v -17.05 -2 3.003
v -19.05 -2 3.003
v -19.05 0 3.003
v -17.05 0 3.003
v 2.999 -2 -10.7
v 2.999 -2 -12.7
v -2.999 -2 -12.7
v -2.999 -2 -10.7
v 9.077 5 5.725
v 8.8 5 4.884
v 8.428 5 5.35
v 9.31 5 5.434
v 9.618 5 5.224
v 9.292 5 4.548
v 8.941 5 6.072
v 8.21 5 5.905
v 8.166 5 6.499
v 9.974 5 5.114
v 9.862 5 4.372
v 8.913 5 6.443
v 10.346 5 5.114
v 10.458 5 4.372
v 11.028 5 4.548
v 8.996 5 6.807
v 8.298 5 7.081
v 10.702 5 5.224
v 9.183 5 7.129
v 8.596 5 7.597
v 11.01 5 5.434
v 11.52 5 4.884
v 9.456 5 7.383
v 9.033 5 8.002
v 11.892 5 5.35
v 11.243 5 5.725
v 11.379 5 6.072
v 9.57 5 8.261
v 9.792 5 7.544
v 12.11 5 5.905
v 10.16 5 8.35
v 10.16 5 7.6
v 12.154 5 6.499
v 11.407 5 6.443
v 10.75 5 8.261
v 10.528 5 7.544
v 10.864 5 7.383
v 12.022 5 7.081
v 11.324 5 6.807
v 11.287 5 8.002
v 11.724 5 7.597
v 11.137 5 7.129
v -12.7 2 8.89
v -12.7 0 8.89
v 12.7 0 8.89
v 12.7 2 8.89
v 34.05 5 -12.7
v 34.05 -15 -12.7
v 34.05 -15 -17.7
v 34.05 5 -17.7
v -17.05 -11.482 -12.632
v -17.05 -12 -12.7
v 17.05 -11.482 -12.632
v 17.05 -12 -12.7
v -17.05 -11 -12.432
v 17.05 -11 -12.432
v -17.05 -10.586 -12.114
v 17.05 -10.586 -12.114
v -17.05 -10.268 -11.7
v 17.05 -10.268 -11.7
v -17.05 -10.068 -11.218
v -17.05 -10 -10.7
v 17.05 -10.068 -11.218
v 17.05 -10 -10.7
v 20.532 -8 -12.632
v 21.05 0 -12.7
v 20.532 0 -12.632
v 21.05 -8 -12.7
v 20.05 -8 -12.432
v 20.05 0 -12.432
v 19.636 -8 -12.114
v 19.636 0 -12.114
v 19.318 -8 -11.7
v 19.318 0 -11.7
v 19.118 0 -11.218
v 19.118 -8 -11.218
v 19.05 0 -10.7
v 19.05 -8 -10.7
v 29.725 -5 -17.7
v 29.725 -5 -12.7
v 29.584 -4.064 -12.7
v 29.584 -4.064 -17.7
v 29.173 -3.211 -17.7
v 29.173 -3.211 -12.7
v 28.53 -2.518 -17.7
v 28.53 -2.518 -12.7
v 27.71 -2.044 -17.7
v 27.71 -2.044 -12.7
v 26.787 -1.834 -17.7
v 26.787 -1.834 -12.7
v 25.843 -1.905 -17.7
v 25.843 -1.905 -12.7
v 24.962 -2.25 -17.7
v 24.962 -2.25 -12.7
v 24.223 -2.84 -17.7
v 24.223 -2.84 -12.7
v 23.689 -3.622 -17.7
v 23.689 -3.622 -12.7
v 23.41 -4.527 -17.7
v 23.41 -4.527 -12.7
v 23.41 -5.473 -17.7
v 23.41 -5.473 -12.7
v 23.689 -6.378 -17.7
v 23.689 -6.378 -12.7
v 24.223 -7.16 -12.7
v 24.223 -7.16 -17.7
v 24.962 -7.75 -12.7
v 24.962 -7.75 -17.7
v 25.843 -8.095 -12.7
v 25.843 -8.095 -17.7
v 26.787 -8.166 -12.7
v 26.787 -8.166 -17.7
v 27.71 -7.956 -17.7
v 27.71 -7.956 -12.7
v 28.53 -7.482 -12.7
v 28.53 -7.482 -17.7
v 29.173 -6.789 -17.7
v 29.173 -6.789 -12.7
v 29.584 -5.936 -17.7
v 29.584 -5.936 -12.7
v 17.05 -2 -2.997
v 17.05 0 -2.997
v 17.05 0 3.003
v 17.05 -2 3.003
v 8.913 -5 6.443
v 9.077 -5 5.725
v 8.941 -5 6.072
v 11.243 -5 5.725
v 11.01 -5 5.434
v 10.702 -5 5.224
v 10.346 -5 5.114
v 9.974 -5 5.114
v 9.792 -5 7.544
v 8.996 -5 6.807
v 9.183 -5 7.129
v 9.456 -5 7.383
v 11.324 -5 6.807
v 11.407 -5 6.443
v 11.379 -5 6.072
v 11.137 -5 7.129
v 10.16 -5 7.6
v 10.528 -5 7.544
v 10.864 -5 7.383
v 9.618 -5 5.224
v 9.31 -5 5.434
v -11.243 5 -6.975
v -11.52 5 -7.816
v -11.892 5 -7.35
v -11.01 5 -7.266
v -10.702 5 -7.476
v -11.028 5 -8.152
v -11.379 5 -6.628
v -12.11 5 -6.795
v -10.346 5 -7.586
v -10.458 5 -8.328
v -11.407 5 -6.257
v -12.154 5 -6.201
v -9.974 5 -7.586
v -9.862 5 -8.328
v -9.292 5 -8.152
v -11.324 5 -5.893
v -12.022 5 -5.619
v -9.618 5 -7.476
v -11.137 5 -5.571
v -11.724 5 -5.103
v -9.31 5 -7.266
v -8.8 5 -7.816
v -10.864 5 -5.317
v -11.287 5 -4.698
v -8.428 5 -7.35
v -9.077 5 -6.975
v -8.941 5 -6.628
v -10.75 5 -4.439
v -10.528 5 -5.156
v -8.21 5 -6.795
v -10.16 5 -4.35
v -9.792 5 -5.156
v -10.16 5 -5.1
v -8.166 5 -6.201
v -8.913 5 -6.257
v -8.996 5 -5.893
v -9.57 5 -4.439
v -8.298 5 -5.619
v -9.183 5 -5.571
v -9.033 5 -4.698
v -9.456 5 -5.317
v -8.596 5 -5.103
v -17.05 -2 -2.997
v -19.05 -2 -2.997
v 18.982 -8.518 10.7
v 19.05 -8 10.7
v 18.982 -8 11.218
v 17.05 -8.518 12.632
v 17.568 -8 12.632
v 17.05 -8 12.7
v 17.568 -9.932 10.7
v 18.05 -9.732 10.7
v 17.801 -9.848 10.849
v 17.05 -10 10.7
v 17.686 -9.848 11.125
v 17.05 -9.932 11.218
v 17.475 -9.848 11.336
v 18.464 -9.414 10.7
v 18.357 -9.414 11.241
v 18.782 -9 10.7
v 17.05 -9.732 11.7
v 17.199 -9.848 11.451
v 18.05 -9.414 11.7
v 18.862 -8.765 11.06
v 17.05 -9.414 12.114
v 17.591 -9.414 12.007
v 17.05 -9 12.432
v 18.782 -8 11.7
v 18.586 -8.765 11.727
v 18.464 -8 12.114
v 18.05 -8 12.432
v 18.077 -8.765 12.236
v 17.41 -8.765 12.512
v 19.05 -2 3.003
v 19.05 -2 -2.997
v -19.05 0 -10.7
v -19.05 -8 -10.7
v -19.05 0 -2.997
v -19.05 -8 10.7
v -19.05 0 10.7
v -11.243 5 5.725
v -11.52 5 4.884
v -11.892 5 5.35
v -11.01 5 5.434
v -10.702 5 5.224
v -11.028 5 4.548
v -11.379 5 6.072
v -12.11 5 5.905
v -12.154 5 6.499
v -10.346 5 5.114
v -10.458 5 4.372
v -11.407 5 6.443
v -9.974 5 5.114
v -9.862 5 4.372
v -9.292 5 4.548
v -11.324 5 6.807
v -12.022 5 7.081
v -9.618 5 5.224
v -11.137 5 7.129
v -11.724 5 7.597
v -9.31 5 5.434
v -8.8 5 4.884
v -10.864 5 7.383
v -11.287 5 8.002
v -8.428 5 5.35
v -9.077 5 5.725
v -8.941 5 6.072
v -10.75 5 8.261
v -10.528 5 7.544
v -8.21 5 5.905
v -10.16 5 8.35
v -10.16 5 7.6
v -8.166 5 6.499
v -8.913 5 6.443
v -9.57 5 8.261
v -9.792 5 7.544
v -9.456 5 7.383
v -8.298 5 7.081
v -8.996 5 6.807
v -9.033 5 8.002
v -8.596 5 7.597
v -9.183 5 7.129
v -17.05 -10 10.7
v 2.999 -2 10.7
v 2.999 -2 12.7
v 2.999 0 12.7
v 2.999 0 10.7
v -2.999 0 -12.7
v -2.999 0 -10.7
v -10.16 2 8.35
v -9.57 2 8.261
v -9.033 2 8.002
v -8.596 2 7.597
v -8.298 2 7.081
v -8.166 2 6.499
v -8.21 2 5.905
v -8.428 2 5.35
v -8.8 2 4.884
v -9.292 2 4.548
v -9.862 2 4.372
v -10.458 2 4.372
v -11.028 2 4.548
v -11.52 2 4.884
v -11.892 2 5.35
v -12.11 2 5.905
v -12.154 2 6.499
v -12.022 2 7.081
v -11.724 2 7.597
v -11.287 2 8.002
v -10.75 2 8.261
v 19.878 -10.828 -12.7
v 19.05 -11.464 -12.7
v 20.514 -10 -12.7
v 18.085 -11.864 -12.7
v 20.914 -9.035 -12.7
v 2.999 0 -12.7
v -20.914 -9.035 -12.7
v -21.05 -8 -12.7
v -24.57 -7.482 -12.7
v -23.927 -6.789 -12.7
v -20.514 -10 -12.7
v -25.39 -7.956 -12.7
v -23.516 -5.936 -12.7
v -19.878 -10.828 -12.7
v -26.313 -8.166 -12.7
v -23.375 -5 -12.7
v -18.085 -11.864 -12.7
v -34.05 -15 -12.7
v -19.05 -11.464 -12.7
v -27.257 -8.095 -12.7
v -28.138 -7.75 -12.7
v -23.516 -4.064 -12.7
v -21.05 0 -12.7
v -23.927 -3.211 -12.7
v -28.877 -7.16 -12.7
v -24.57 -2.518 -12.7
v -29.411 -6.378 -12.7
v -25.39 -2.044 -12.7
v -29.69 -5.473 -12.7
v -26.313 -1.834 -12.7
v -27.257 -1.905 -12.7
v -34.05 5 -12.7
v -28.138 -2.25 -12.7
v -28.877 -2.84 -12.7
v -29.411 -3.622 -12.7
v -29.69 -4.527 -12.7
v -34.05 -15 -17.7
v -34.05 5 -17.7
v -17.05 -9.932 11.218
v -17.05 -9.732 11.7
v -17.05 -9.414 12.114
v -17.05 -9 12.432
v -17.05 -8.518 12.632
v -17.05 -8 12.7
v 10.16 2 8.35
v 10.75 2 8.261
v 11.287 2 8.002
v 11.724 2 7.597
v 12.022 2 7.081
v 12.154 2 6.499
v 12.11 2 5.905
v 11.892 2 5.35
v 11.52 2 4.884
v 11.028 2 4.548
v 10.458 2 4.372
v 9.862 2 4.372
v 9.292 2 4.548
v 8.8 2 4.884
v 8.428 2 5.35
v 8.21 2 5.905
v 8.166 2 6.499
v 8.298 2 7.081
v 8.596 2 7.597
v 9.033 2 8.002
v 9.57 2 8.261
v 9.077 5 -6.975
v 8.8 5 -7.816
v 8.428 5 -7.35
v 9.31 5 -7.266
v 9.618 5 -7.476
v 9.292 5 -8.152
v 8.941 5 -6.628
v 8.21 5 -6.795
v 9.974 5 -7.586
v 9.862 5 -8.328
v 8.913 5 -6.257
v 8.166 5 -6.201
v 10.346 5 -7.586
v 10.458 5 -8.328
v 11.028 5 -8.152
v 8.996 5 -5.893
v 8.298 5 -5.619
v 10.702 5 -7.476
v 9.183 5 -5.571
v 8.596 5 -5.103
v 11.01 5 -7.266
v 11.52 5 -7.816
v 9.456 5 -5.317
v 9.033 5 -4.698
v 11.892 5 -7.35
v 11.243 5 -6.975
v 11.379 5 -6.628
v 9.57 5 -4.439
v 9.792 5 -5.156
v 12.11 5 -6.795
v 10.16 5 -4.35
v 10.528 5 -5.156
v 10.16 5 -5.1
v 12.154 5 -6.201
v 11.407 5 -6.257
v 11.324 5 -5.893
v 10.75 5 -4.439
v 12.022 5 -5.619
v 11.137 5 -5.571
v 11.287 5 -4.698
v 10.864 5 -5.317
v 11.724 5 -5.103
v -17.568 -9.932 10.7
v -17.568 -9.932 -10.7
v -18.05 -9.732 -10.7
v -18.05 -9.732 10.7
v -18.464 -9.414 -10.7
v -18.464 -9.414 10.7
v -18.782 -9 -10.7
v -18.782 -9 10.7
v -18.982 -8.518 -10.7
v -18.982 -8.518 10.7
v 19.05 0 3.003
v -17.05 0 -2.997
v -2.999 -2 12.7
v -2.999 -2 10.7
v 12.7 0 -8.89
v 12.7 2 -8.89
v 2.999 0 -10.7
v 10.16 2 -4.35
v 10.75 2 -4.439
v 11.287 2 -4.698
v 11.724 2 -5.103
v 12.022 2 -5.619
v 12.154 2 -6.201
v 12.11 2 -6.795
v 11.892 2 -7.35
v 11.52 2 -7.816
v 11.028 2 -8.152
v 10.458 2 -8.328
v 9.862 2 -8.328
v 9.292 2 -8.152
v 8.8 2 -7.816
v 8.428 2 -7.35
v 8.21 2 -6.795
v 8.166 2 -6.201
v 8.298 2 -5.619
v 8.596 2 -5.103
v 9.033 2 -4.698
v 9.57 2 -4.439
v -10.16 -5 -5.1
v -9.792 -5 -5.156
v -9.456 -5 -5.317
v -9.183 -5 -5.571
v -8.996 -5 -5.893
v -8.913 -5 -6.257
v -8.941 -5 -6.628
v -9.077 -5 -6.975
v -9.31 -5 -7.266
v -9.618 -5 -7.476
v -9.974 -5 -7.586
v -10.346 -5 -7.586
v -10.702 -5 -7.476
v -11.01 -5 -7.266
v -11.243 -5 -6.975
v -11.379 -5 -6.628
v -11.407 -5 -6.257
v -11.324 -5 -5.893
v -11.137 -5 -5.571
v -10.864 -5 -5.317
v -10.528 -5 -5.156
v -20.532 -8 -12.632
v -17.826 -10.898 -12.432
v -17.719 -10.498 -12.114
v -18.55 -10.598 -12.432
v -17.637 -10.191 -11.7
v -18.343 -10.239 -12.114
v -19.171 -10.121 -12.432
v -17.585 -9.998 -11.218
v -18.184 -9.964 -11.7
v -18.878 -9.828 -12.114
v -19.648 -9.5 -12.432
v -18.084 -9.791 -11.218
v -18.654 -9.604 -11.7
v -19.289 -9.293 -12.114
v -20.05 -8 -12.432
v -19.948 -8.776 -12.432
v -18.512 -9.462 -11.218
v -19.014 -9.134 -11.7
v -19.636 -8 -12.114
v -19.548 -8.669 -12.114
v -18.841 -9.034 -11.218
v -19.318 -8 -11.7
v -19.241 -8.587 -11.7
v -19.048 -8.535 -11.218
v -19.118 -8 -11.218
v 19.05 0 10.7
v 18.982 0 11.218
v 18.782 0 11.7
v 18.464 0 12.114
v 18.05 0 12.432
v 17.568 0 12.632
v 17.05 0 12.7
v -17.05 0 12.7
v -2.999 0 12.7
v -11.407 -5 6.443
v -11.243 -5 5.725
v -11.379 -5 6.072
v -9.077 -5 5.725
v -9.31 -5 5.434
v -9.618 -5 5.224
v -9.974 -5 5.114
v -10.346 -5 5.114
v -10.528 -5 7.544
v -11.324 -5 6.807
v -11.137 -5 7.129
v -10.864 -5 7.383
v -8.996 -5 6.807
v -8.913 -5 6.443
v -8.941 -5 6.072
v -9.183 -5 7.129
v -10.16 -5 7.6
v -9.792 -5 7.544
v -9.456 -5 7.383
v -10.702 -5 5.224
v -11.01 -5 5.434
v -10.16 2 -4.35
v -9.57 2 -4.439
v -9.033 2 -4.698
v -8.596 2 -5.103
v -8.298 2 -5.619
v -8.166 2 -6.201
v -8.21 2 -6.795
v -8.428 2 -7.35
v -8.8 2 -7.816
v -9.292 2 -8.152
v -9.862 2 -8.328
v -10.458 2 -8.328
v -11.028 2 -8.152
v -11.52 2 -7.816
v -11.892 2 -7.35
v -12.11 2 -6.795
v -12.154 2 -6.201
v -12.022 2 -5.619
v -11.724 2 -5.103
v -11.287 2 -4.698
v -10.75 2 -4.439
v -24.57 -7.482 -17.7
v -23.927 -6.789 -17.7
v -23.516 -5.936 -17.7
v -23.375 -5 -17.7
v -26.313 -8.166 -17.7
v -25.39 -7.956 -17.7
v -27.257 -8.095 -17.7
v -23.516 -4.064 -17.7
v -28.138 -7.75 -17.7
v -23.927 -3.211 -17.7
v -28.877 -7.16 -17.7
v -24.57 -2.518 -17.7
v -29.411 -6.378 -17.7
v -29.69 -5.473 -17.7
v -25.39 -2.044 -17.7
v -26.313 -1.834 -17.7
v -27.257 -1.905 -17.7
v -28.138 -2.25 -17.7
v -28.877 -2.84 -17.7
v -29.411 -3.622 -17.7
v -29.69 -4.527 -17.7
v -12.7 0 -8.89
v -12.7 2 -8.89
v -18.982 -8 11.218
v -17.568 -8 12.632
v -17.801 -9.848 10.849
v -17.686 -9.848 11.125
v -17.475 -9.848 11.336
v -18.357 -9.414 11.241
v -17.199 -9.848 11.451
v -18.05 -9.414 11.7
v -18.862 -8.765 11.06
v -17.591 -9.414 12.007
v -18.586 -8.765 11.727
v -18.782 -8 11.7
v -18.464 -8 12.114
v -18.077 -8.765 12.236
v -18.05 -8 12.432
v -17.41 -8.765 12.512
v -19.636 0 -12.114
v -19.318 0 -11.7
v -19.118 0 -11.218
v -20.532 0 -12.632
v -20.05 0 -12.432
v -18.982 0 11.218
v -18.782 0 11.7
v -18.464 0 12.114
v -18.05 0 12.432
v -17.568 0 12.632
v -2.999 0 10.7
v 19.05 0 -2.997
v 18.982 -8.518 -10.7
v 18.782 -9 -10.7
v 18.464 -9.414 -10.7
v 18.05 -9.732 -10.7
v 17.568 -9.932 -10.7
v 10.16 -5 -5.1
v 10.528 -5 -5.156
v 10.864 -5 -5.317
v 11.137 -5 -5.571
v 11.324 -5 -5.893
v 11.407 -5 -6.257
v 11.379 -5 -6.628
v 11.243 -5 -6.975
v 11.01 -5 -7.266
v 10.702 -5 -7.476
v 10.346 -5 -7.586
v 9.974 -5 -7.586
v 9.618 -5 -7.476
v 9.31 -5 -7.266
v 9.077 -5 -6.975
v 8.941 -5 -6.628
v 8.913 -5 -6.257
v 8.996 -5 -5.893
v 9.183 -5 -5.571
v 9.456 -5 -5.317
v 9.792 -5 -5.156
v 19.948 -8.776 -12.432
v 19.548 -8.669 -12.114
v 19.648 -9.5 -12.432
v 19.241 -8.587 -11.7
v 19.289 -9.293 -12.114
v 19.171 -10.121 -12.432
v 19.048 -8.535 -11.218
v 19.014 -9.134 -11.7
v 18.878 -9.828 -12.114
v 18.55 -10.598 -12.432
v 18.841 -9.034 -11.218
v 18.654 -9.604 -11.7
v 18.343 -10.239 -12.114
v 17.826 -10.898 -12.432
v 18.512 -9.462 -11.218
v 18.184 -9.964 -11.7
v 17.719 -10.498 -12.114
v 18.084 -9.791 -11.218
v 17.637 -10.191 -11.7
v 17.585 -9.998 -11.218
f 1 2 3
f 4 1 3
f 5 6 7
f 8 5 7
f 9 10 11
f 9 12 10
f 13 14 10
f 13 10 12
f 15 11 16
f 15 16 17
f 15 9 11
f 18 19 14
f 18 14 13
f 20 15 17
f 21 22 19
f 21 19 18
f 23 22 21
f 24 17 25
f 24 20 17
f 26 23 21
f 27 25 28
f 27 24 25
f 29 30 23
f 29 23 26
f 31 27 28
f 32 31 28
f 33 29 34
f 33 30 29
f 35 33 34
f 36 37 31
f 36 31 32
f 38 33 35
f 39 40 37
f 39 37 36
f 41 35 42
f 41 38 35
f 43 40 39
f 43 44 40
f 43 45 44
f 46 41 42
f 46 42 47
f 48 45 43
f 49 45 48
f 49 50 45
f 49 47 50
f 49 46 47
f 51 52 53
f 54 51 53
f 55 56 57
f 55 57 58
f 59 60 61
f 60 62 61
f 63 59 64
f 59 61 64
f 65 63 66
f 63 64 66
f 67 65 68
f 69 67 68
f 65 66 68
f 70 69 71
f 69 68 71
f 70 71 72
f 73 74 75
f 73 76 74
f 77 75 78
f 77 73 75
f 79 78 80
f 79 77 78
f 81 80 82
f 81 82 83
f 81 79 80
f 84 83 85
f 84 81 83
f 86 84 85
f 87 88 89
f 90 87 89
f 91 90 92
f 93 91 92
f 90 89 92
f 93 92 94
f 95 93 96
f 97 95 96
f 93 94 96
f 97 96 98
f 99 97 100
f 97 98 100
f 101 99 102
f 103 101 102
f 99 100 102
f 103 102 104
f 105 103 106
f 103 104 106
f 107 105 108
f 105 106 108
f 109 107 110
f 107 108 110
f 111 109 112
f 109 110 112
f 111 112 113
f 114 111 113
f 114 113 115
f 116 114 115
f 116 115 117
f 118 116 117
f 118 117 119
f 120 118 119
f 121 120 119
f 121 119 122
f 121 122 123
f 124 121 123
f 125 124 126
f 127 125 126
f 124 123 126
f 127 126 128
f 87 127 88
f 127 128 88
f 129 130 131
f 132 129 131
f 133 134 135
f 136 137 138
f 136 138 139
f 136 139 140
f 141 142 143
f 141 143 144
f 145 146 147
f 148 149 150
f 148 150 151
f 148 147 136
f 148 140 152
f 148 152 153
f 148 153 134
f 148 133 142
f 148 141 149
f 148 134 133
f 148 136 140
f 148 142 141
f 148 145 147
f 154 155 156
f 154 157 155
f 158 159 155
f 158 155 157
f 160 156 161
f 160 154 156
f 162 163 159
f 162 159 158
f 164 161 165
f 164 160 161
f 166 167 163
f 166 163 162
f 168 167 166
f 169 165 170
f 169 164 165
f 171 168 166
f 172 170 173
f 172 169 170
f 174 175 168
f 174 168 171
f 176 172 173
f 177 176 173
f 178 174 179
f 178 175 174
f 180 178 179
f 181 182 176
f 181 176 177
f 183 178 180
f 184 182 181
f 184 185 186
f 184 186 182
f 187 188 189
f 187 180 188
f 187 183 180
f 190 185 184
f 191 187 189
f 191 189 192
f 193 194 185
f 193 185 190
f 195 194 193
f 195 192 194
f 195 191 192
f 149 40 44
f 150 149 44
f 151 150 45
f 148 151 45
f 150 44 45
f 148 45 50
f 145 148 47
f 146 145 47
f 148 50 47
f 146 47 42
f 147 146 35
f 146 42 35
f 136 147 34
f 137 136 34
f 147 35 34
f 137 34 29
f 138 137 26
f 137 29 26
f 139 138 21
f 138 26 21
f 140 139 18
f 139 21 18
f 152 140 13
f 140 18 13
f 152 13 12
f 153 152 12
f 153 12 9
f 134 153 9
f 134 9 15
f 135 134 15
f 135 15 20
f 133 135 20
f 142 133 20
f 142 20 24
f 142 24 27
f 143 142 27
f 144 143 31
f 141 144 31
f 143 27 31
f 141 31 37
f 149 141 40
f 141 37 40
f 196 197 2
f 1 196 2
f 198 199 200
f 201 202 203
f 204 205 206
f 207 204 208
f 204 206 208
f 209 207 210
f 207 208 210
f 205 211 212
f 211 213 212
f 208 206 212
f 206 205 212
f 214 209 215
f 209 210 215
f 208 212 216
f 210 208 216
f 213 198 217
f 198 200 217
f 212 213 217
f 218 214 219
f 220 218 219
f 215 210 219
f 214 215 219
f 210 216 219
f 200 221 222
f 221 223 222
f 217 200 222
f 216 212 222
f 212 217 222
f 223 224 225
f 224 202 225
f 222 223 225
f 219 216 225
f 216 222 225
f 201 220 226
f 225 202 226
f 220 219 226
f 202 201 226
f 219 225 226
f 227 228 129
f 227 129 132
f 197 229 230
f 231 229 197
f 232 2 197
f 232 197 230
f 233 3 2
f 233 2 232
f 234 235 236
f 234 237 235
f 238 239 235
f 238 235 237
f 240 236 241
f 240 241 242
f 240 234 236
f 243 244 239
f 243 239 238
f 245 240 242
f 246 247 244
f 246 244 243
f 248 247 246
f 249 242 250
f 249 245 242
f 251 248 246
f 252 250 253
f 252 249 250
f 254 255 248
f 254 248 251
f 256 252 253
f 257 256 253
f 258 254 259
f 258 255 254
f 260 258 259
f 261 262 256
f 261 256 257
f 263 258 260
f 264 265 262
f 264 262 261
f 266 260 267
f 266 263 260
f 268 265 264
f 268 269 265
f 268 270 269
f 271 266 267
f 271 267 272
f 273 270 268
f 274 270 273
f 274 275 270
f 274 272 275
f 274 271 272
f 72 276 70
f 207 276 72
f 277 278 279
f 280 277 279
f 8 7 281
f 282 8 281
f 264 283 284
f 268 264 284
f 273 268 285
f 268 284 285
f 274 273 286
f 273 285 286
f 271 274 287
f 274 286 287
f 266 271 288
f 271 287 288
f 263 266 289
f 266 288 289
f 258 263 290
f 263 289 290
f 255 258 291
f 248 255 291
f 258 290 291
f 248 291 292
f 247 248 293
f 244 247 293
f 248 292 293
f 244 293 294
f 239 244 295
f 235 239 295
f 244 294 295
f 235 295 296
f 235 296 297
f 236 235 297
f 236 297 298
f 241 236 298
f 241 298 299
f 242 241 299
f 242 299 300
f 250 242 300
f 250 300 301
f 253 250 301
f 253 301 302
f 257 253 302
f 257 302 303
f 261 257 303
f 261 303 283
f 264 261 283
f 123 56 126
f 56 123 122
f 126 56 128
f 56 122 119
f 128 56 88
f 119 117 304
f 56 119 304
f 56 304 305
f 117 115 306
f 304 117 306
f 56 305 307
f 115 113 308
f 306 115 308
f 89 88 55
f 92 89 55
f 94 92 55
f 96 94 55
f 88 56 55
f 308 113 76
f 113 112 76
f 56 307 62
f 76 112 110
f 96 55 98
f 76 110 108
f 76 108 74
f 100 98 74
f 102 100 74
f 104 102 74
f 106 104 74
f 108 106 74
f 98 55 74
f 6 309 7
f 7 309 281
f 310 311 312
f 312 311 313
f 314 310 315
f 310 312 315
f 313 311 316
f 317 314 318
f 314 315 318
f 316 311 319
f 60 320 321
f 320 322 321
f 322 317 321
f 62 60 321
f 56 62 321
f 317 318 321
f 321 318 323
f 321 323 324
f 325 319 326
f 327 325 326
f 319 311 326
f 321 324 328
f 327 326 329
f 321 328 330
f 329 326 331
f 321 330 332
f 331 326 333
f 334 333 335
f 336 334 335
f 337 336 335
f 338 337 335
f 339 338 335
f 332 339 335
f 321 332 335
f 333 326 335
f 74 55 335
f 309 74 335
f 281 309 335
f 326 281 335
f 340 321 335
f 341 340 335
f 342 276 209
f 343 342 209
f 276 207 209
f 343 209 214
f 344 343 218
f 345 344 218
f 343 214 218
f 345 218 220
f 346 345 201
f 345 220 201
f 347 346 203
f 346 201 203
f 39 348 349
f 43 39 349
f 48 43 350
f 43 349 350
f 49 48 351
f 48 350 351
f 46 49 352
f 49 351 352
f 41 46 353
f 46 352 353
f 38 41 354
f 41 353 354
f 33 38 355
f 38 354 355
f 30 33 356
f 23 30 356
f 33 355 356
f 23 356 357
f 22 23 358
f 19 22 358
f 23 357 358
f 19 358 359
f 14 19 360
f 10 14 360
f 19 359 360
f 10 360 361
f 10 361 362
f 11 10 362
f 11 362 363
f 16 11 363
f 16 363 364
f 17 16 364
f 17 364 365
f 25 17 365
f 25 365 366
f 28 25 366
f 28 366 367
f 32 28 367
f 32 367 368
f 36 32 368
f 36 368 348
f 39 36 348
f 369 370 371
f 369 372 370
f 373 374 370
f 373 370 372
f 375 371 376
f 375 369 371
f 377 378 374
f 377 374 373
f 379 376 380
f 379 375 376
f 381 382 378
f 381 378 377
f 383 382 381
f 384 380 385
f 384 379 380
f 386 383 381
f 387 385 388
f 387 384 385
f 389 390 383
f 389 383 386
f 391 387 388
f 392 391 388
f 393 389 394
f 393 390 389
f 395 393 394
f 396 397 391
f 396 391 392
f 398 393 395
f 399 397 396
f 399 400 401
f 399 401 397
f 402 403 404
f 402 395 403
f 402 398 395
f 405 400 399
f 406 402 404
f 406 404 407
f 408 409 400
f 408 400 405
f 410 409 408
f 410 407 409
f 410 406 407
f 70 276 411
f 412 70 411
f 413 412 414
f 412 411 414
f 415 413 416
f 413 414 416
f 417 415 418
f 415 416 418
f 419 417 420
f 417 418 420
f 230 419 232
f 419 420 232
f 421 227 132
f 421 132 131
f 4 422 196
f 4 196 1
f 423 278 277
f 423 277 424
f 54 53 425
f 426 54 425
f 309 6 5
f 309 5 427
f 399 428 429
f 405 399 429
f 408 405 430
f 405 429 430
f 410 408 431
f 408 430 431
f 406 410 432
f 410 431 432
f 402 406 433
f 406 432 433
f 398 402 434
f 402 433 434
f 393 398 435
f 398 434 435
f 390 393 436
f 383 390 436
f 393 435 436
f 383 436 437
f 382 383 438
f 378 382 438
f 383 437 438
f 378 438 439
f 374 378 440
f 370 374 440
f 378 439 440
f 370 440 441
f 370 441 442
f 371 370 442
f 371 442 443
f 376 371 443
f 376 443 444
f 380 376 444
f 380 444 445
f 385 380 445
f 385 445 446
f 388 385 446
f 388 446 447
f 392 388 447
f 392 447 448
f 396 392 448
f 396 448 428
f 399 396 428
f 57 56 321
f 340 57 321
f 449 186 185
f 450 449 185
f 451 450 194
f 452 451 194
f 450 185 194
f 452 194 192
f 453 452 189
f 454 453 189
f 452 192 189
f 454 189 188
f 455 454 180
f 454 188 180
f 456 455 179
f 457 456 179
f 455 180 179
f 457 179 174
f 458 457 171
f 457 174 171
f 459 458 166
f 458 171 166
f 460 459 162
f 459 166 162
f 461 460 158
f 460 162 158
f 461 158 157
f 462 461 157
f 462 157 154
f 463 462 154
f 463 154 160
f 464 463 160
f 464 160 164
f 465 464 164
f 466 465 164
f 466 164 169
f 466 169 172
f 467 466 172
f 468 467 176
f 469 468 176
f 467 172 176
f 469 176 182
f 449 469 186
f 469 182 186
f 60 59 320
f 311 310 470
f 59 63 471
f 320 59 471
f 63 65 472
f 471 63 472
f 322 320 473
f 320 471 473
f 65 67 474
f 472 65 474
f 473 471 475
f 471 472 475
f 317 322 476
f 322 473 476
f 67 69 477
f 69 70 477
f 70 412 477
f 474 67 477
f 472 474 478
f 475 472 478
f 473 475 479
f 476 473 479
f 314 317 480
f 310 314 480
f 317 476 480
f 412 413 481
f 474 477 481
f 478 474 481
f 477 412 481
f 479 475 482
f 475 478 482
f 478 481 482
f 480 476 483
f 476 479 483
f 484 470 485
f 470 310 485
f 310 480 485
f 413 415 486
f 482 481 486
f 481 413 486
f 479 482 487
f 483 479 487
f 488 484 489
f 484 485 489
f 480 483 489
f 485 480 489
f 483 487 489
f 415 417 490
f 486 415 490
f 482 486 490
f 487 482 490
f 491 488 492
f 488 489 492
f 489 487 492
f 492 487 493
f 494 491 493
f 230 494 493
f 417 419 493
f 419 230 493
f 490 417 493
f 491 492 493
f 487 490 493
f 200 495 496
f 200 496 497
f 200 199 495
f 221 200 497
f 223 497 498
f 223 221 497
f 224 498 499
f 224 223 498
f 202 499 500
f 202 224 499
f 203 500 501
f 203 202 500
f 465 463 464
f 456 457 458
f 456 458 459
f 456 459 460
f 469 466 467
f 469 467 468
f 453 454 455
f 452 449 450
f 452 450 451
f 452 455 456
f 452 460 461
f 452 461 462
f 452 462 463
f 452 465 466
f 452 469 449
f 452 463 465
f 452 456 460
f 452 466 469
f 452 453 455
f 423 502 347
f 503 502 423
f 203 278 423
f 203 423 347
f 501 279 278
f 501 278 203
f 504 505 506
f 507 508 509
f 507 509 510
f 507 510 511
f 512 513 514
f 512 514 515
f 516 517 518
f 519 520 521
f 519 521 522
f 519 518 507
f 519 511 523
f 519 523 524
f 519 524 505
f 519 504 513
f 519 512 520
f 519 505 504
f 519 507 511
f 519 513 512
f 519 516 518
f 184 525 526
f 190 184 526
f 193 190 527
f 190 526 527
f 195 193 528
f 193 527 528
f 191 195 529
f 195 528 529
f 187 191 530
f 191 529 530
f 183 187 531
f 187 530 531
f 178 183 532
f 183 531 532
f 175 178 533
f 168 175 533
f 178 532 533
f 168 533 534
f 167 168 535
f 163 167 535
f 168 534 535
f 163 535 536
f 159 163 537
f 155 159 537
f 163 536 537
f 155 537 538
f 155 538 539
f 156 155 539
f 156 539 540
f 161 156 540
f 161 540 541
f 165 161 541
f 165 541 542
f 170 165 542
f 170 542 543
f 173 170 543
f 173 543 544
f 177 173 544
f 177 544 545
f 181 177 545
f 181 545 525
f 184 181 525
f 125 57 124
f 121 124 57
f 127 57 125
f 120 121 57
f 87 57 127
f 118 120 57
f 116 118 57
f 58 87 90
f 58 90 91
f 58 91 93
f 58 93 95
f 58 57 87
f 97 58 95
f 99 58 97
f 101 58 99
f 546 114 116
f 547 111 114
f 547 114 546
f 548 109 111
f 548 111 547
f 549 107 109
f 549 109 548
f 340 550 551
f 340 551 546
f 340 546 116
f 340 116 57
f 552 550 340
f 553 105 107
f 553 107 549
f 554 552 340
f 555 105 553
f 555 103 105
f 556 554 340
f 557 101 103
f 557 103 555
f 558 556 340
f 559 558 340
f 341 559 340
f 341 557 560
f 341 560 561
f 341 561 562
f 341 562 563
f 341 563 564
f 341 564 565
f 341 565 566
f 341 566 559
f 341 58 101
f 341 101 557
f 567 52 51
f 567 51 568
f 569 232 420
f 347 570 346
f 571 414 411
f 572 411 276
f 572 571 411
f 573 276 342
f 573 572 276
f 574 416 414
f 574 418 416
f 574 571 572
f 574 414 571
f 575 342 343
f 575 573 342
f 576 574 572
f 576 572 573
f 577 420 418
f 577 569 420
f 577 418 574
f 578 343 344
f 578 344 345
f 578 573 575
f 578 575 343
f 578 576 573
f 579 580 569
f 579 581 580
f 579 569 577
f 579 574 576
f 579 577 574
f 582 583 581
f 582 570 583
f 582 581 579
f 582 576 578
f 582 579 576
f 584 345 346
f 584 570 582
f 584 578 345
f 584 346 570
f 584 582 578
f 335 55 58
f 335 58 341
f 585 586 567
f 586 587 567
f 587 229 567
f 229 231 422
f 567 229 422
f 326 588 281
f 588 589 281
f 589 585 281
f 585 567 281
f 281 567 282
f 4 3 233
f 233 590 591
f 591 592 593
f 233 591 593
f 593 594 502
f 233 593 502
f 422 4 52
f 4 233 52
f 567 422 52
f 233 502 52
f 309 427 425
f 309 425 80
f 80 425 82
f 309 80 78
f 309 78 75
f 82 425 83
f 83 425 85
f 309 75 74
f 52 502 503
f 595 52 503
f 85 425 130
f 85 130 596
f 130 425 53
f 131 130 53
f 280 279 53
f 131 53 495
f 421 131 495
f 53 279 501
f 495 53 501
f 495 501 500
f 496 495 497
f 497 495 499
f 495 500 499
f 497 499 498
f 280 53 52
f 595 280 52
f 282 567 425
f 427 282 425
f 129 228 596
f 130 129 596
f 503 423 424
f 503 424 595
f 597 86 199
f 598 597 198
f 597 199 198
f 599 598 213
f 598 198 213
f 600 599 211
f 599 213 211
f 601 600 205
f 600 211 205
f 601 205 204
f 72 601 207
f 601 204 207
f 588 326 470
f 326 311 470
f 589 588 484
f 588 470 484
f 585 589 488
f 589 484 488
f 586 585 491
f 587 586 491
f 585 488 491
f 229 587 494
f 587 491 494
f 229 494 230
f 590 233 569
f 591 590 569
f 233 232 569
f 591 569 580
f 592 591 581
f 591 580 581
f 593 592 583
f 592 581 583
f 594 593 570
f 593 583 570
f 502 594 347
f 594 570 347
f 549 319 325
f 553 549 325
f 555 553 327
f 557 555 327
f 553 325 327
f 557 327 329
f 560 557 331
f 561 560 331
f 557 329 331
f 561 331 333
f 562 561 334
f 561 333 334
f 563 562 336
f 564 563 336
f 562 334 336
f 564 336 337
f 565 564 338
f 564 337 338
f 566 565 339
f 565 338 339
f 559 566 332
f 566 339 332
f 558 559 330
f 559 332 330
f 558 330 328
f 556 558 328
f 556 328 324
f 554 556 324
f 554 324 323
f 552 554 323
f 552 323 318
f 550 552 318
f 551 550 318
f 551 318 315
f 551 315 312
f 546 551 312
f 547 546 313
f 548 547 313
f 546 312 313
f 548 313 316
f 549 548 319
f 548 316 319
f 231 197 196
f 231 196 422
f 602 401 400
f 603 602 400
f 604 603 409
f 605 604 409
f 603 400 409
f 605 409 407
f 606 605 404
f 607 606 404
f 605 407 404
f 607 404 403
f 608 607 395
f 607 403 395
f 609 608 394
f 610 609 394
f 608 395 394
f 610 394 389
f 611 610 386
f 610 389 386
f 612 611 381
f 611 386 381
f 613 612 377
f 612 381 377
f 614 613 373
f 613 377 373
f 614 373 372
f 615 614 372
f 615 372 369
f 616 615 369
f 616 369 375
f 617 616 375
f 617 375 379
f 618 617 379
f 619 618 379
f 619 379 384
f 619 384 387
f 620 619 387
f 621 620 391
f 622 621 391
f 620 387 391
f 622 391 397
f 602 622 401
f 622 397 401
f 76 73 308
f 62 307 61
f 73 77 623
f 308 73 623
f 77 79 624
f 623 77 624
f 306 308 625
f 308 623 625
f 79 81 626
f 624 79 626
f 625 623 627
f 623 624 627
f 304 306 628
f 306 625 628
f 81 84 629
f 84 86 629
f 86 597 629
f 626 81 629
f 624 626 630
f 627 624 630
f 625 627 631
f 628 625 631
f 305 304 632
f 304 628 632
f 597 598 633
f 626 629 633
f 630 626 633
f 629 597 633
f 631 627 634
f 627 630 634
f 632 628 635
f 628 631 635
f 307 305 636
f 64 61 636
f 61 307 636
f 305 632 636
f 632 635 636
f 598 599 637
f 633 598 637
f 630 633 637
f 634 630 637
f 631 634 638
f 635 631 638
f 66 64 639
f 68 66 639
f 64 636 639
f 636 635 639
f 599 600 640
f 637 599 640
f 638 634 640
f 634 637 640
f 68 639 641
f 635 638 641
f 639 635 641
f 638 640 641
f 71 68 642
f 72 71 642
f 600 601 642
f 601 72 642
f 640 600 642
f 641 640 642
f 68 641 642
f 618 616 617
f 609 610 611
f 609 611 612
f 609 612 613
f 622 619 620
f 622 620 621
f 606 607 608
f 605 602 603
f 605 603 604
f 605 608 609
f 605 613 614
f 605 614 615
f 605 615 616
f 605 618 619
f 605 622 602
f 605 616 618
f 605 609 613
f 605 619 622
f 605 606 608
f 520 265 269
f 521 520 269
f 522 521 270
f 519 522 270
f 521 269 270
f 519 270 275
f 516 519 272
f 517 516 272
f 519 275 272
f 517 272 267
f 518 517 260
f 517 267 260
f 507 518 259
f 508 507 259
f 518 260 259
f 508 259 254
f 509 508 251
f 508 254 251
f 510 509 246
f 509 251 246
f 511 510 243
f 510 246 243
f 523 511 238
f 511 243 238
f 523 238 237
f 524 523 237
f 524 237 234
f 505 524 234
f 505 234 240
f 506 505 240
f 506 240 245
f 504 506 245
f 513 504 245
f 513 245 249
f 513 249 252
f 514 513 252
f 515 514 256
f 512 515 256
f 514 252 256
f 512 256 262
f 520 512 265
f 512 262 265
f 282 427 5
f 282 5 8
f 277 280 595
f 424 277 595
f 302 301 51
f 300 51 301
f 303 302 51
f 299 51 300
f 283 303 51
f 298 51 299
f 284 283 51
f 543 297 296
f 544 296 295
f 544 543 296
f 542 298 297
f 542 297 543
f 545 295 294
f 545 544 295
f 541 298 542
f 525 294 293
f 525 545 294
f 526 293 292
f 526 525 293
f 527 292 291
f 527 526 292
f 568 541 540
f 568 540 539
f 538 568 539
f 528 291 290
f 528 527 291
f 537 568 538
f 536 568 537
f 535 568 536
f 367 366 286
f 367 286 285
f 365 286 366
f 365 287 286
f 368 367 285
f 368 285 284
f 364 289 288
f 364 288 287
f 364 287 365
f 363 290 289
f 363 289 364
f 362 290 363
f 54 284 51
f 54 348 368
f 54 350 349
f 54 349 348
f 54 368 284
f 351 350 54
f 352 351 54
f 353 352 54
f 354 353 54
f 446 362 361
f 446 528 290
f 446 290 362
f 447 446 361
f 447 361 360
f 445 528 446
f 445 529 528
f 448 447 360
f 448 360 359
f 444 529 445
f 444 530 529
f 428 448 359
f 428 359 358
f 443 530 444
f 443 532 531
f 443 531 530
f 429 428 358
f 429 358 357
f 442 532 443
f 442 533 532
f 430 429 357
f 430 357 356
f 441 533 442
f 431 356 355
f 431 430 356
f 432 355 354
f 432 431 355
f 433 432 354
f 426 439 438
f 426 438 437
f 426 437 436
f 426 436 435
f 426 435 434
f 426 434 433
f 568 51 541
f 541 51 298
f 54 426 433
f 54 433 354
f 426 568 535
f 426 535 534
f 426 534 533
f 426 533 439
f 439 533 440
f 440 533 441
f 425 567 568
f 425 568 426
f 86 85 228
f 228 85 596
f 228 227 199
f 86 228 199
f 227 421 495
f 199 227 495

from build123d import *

# Parameters (mm, degrees)
SKETCH1_R             = 2
BOSS_EXTRUDE1_DEPTH   = 5
BOSS_EXTRUDE1_2_DEPTH = 5
BOSS_EXTRUDE1_3_DEPTH = 5
BOSS_EXTRUDE1_4_DEPTH = 5
SKETCH3_W             = 38.1
SKETCH3_H             = 25.4
BOSS_EXTRUDE2_DEPTH   = 10
SKETCH4_W             = 25.4
SKETCH4_H             = 17.78
BOSS_EXTRUDE3_DEPTH   = 2
SKETCH2_R             = 1.25
CUT_EXTRUDE1_DEPTH    = 10
SKETCH6_W             = 5.998216144
SKETCH6_H             = 2
CUT_EXTRUDE3_DEPTH    = 2
SKETCH7_W             = 6
SKETCH7_H             = 2
CUT_EXTRUDE4_DEPTH    = 2
SKETCH8_W             = 68.1
SKETCH8_H             = 20
BOSS_EXTRUDE4_DEPTH   = 5
SKETCH9_R             = 3.175
CUT_EXTRUDE5_DEPTH    = 5
FILLET1_R             = 2


with BuildPart() as part:
    # Sketch1 → Boss-Extrude1 (new body)
    with BuildSketch(Plane(origin=(0, 0, 0), x_dir=(1, 0, 0), z_dir=(0, 1, 0))):
        with Locations(Location((-10.16, 6.35, 0), (0, 0, 270))):
            Circle(SKETCH1_R)
    extrude(amount=BOSS_EXTRUDE1_DEPTH)



with BuildPart() as body_2:
    # Sketch1 → Boss-Extrude1 2 (new body)
    with BuildSketch(Plane(origin=(0, 0, 0), x_dir=(1, 0, 0), z_dir=(0, 1, 0))):
        with Locations(Location((10.16, 6.35, 0), (0, 0, 270))):
            Circle(SKETCH1_R)
    extrude(amount=BOSS_EXTRUDE1_2_DEPTH)


with BuildPart() as body_3:
    # Sketch1 → Boss-Extrude1 3 (new body)
    with BuildSketch(Plane(origin=(0, 0, 0), x_dir=(1, 0, 0), z_dir=(0, 1, 0))):
        with Locations(Location((10.16, -6.35, 0), (0, 0, 270))):
            Circle(SKETCH1_R)
    extrude(amount=BOSS_EXTRUDE1_3_DEPTH)


with BuildPart() as body_4:
    # Sketch1 → Boss-Extrude1 4 (new body)
    with BuildSketch(Plane(origin=(0, 0, 0), x_dir=(1, 0, 0), z_dir=(0, 1, 0))):
        with Locations(Location((-10.16, -6.35, 0), (0, 0, 270))):
            Circle(SKETCH1_R)
    extrude(amount=BOSS_EXTRUDE1_4_DEPTH)


with BuildPart() as part_1:
    add(part.part)

    add(body_2.part)  # Boss-Extrude2 merges body 2

    add(body_3.part)  # Boss-Extrude2 merges body 3

    add(body_4.part)  # Boss-Extrude2 merges body 4
    # Sketch3 → Boss-Extrude2 (add)
    with BuildSketch(Plane.XZ):
        Rectangle(SKETCH3_W, SKETCH3_H)
    extrude(amount=BOSS_EXTRUDE2_DEPTH)

    # Sketch4 → Boss-Extrude3 (add)
    with BuildSketch(Plane(origin=(0, 0, 0), x_dir=(1, 0, 0), z_dir=(0, 1, 0))):
        Rectangle(SKETCH4_W, SKETCH4_H)
    extrude(amount=BOSS_EXTRUDE3_DEPTH)

    # Sketch2 → Cut-Extrude1 (cut)
    with BuildSketch(Plane(origin=(0, 5, 0), x_dir=(1, 0, 0), z_dir=(0, 1, 0))):
        with Locations(Location((-10.16, 6.35, 0), (0, 0, 270))):
            Circle(SKETCH2_R)
        with Locations(Location((10.16, 6.35, 0), (0, 0, 270))):
            Circle(SKETCH2_R)
        with Locations(Location((10.16, -6.35, 0), (0, 0, 270))):
            Circle(SKETCH2_R)
        with Locations(Location((-10.16, -6.35, 0), (0, 0, 270))):
            Circle(SKETCH2_R)
    extrude(amount=-CUT_EXTRUDE1_DEPTH, mode=Mode.SUBTRACT)

    # Sketch6 → Cut-Extrude3 (cut)
    with BuildSketch(Plane(origin=(0, 0, -12.7), x_dir=(-1, 0, 0), z_dir=(0, 0, -1))):
        with Locations((0, -1)):
            Rectangle(SKETCH6_W, SKETCH6_H)
    cut_extrude3 = extrude(amount=-CUT_EXTRUDE3_DEPTH, mode=Mode.SUBTRACT)

    # Mirror1: Cut-Extrude3 across plane
    add(cut_extrude3.mirror(Plane.XY), mode=Mode.SUBTRACT)

    # Sketch7 → Cut-Extrude4 (cut)
    with BuildSketch(Plane.ZY.offset(19.05)):
        with Locations((0.00303896, -1)):
            Rectangle(SKETCH7_W, SKETCH7_H)
    cut_extrude4 = extrude(amount=-CUT_EXTRUDE4_DEPTH, mode=Mode.SUBTRACT)

    # Mirror2: Cut-Extrude4 across plane
    add(cut_extrude4.mirror(Plane(origin=(0, 0, 0), x_dir=(0, 0, 1), z_dir=(1, 0, 0))), mode=Mode.SUBTRACT)

    # Sketch8 → Boss-Extrude4 (add)
    with BuildSketch(Plane(origin=(0, 0, -12.7), x_dir=(-1, 0, 0), z_dir=(0, 0, -1))):
        with Locations((0, -5)):
            Rectangle(SKETCH8_W, SKETCH8_H)
    extrude(amount=BOSS_EXTRUDE4_DEPTH)

    # Sketch9 → Cut-Extrude5 (cut)
    with BuildSketch(Plane.XY.offset(-12.7)):
        with Locations((-26.55, -5)):
            Circle(SKETCH9_R)
        with Locations((26.55, -5)):
            Circle(SKETCH9_R)
    extrude(amount=-CUT_EXTRUDE5_DEPTH, mode=Mode.SUBTRACT)

    # Fillet1
    fillet1_edges = [part_1.edges().sort_by_distance(p)[0] for p in [
        (-19.05, -5, 12.7),
        (-19.05, -5, -12.7),
        (19.05, -5, -12.7),
        (19.05, -5, 12.7),
        (-19.05, -10, 0),
        (0, -10, -12.7),
        (19.05, -10, 0),
        (0, -10, 12.7),
    ]]
    fillet(fillet1_edges, radius=FILLET1_R)


solid = part_1.part
